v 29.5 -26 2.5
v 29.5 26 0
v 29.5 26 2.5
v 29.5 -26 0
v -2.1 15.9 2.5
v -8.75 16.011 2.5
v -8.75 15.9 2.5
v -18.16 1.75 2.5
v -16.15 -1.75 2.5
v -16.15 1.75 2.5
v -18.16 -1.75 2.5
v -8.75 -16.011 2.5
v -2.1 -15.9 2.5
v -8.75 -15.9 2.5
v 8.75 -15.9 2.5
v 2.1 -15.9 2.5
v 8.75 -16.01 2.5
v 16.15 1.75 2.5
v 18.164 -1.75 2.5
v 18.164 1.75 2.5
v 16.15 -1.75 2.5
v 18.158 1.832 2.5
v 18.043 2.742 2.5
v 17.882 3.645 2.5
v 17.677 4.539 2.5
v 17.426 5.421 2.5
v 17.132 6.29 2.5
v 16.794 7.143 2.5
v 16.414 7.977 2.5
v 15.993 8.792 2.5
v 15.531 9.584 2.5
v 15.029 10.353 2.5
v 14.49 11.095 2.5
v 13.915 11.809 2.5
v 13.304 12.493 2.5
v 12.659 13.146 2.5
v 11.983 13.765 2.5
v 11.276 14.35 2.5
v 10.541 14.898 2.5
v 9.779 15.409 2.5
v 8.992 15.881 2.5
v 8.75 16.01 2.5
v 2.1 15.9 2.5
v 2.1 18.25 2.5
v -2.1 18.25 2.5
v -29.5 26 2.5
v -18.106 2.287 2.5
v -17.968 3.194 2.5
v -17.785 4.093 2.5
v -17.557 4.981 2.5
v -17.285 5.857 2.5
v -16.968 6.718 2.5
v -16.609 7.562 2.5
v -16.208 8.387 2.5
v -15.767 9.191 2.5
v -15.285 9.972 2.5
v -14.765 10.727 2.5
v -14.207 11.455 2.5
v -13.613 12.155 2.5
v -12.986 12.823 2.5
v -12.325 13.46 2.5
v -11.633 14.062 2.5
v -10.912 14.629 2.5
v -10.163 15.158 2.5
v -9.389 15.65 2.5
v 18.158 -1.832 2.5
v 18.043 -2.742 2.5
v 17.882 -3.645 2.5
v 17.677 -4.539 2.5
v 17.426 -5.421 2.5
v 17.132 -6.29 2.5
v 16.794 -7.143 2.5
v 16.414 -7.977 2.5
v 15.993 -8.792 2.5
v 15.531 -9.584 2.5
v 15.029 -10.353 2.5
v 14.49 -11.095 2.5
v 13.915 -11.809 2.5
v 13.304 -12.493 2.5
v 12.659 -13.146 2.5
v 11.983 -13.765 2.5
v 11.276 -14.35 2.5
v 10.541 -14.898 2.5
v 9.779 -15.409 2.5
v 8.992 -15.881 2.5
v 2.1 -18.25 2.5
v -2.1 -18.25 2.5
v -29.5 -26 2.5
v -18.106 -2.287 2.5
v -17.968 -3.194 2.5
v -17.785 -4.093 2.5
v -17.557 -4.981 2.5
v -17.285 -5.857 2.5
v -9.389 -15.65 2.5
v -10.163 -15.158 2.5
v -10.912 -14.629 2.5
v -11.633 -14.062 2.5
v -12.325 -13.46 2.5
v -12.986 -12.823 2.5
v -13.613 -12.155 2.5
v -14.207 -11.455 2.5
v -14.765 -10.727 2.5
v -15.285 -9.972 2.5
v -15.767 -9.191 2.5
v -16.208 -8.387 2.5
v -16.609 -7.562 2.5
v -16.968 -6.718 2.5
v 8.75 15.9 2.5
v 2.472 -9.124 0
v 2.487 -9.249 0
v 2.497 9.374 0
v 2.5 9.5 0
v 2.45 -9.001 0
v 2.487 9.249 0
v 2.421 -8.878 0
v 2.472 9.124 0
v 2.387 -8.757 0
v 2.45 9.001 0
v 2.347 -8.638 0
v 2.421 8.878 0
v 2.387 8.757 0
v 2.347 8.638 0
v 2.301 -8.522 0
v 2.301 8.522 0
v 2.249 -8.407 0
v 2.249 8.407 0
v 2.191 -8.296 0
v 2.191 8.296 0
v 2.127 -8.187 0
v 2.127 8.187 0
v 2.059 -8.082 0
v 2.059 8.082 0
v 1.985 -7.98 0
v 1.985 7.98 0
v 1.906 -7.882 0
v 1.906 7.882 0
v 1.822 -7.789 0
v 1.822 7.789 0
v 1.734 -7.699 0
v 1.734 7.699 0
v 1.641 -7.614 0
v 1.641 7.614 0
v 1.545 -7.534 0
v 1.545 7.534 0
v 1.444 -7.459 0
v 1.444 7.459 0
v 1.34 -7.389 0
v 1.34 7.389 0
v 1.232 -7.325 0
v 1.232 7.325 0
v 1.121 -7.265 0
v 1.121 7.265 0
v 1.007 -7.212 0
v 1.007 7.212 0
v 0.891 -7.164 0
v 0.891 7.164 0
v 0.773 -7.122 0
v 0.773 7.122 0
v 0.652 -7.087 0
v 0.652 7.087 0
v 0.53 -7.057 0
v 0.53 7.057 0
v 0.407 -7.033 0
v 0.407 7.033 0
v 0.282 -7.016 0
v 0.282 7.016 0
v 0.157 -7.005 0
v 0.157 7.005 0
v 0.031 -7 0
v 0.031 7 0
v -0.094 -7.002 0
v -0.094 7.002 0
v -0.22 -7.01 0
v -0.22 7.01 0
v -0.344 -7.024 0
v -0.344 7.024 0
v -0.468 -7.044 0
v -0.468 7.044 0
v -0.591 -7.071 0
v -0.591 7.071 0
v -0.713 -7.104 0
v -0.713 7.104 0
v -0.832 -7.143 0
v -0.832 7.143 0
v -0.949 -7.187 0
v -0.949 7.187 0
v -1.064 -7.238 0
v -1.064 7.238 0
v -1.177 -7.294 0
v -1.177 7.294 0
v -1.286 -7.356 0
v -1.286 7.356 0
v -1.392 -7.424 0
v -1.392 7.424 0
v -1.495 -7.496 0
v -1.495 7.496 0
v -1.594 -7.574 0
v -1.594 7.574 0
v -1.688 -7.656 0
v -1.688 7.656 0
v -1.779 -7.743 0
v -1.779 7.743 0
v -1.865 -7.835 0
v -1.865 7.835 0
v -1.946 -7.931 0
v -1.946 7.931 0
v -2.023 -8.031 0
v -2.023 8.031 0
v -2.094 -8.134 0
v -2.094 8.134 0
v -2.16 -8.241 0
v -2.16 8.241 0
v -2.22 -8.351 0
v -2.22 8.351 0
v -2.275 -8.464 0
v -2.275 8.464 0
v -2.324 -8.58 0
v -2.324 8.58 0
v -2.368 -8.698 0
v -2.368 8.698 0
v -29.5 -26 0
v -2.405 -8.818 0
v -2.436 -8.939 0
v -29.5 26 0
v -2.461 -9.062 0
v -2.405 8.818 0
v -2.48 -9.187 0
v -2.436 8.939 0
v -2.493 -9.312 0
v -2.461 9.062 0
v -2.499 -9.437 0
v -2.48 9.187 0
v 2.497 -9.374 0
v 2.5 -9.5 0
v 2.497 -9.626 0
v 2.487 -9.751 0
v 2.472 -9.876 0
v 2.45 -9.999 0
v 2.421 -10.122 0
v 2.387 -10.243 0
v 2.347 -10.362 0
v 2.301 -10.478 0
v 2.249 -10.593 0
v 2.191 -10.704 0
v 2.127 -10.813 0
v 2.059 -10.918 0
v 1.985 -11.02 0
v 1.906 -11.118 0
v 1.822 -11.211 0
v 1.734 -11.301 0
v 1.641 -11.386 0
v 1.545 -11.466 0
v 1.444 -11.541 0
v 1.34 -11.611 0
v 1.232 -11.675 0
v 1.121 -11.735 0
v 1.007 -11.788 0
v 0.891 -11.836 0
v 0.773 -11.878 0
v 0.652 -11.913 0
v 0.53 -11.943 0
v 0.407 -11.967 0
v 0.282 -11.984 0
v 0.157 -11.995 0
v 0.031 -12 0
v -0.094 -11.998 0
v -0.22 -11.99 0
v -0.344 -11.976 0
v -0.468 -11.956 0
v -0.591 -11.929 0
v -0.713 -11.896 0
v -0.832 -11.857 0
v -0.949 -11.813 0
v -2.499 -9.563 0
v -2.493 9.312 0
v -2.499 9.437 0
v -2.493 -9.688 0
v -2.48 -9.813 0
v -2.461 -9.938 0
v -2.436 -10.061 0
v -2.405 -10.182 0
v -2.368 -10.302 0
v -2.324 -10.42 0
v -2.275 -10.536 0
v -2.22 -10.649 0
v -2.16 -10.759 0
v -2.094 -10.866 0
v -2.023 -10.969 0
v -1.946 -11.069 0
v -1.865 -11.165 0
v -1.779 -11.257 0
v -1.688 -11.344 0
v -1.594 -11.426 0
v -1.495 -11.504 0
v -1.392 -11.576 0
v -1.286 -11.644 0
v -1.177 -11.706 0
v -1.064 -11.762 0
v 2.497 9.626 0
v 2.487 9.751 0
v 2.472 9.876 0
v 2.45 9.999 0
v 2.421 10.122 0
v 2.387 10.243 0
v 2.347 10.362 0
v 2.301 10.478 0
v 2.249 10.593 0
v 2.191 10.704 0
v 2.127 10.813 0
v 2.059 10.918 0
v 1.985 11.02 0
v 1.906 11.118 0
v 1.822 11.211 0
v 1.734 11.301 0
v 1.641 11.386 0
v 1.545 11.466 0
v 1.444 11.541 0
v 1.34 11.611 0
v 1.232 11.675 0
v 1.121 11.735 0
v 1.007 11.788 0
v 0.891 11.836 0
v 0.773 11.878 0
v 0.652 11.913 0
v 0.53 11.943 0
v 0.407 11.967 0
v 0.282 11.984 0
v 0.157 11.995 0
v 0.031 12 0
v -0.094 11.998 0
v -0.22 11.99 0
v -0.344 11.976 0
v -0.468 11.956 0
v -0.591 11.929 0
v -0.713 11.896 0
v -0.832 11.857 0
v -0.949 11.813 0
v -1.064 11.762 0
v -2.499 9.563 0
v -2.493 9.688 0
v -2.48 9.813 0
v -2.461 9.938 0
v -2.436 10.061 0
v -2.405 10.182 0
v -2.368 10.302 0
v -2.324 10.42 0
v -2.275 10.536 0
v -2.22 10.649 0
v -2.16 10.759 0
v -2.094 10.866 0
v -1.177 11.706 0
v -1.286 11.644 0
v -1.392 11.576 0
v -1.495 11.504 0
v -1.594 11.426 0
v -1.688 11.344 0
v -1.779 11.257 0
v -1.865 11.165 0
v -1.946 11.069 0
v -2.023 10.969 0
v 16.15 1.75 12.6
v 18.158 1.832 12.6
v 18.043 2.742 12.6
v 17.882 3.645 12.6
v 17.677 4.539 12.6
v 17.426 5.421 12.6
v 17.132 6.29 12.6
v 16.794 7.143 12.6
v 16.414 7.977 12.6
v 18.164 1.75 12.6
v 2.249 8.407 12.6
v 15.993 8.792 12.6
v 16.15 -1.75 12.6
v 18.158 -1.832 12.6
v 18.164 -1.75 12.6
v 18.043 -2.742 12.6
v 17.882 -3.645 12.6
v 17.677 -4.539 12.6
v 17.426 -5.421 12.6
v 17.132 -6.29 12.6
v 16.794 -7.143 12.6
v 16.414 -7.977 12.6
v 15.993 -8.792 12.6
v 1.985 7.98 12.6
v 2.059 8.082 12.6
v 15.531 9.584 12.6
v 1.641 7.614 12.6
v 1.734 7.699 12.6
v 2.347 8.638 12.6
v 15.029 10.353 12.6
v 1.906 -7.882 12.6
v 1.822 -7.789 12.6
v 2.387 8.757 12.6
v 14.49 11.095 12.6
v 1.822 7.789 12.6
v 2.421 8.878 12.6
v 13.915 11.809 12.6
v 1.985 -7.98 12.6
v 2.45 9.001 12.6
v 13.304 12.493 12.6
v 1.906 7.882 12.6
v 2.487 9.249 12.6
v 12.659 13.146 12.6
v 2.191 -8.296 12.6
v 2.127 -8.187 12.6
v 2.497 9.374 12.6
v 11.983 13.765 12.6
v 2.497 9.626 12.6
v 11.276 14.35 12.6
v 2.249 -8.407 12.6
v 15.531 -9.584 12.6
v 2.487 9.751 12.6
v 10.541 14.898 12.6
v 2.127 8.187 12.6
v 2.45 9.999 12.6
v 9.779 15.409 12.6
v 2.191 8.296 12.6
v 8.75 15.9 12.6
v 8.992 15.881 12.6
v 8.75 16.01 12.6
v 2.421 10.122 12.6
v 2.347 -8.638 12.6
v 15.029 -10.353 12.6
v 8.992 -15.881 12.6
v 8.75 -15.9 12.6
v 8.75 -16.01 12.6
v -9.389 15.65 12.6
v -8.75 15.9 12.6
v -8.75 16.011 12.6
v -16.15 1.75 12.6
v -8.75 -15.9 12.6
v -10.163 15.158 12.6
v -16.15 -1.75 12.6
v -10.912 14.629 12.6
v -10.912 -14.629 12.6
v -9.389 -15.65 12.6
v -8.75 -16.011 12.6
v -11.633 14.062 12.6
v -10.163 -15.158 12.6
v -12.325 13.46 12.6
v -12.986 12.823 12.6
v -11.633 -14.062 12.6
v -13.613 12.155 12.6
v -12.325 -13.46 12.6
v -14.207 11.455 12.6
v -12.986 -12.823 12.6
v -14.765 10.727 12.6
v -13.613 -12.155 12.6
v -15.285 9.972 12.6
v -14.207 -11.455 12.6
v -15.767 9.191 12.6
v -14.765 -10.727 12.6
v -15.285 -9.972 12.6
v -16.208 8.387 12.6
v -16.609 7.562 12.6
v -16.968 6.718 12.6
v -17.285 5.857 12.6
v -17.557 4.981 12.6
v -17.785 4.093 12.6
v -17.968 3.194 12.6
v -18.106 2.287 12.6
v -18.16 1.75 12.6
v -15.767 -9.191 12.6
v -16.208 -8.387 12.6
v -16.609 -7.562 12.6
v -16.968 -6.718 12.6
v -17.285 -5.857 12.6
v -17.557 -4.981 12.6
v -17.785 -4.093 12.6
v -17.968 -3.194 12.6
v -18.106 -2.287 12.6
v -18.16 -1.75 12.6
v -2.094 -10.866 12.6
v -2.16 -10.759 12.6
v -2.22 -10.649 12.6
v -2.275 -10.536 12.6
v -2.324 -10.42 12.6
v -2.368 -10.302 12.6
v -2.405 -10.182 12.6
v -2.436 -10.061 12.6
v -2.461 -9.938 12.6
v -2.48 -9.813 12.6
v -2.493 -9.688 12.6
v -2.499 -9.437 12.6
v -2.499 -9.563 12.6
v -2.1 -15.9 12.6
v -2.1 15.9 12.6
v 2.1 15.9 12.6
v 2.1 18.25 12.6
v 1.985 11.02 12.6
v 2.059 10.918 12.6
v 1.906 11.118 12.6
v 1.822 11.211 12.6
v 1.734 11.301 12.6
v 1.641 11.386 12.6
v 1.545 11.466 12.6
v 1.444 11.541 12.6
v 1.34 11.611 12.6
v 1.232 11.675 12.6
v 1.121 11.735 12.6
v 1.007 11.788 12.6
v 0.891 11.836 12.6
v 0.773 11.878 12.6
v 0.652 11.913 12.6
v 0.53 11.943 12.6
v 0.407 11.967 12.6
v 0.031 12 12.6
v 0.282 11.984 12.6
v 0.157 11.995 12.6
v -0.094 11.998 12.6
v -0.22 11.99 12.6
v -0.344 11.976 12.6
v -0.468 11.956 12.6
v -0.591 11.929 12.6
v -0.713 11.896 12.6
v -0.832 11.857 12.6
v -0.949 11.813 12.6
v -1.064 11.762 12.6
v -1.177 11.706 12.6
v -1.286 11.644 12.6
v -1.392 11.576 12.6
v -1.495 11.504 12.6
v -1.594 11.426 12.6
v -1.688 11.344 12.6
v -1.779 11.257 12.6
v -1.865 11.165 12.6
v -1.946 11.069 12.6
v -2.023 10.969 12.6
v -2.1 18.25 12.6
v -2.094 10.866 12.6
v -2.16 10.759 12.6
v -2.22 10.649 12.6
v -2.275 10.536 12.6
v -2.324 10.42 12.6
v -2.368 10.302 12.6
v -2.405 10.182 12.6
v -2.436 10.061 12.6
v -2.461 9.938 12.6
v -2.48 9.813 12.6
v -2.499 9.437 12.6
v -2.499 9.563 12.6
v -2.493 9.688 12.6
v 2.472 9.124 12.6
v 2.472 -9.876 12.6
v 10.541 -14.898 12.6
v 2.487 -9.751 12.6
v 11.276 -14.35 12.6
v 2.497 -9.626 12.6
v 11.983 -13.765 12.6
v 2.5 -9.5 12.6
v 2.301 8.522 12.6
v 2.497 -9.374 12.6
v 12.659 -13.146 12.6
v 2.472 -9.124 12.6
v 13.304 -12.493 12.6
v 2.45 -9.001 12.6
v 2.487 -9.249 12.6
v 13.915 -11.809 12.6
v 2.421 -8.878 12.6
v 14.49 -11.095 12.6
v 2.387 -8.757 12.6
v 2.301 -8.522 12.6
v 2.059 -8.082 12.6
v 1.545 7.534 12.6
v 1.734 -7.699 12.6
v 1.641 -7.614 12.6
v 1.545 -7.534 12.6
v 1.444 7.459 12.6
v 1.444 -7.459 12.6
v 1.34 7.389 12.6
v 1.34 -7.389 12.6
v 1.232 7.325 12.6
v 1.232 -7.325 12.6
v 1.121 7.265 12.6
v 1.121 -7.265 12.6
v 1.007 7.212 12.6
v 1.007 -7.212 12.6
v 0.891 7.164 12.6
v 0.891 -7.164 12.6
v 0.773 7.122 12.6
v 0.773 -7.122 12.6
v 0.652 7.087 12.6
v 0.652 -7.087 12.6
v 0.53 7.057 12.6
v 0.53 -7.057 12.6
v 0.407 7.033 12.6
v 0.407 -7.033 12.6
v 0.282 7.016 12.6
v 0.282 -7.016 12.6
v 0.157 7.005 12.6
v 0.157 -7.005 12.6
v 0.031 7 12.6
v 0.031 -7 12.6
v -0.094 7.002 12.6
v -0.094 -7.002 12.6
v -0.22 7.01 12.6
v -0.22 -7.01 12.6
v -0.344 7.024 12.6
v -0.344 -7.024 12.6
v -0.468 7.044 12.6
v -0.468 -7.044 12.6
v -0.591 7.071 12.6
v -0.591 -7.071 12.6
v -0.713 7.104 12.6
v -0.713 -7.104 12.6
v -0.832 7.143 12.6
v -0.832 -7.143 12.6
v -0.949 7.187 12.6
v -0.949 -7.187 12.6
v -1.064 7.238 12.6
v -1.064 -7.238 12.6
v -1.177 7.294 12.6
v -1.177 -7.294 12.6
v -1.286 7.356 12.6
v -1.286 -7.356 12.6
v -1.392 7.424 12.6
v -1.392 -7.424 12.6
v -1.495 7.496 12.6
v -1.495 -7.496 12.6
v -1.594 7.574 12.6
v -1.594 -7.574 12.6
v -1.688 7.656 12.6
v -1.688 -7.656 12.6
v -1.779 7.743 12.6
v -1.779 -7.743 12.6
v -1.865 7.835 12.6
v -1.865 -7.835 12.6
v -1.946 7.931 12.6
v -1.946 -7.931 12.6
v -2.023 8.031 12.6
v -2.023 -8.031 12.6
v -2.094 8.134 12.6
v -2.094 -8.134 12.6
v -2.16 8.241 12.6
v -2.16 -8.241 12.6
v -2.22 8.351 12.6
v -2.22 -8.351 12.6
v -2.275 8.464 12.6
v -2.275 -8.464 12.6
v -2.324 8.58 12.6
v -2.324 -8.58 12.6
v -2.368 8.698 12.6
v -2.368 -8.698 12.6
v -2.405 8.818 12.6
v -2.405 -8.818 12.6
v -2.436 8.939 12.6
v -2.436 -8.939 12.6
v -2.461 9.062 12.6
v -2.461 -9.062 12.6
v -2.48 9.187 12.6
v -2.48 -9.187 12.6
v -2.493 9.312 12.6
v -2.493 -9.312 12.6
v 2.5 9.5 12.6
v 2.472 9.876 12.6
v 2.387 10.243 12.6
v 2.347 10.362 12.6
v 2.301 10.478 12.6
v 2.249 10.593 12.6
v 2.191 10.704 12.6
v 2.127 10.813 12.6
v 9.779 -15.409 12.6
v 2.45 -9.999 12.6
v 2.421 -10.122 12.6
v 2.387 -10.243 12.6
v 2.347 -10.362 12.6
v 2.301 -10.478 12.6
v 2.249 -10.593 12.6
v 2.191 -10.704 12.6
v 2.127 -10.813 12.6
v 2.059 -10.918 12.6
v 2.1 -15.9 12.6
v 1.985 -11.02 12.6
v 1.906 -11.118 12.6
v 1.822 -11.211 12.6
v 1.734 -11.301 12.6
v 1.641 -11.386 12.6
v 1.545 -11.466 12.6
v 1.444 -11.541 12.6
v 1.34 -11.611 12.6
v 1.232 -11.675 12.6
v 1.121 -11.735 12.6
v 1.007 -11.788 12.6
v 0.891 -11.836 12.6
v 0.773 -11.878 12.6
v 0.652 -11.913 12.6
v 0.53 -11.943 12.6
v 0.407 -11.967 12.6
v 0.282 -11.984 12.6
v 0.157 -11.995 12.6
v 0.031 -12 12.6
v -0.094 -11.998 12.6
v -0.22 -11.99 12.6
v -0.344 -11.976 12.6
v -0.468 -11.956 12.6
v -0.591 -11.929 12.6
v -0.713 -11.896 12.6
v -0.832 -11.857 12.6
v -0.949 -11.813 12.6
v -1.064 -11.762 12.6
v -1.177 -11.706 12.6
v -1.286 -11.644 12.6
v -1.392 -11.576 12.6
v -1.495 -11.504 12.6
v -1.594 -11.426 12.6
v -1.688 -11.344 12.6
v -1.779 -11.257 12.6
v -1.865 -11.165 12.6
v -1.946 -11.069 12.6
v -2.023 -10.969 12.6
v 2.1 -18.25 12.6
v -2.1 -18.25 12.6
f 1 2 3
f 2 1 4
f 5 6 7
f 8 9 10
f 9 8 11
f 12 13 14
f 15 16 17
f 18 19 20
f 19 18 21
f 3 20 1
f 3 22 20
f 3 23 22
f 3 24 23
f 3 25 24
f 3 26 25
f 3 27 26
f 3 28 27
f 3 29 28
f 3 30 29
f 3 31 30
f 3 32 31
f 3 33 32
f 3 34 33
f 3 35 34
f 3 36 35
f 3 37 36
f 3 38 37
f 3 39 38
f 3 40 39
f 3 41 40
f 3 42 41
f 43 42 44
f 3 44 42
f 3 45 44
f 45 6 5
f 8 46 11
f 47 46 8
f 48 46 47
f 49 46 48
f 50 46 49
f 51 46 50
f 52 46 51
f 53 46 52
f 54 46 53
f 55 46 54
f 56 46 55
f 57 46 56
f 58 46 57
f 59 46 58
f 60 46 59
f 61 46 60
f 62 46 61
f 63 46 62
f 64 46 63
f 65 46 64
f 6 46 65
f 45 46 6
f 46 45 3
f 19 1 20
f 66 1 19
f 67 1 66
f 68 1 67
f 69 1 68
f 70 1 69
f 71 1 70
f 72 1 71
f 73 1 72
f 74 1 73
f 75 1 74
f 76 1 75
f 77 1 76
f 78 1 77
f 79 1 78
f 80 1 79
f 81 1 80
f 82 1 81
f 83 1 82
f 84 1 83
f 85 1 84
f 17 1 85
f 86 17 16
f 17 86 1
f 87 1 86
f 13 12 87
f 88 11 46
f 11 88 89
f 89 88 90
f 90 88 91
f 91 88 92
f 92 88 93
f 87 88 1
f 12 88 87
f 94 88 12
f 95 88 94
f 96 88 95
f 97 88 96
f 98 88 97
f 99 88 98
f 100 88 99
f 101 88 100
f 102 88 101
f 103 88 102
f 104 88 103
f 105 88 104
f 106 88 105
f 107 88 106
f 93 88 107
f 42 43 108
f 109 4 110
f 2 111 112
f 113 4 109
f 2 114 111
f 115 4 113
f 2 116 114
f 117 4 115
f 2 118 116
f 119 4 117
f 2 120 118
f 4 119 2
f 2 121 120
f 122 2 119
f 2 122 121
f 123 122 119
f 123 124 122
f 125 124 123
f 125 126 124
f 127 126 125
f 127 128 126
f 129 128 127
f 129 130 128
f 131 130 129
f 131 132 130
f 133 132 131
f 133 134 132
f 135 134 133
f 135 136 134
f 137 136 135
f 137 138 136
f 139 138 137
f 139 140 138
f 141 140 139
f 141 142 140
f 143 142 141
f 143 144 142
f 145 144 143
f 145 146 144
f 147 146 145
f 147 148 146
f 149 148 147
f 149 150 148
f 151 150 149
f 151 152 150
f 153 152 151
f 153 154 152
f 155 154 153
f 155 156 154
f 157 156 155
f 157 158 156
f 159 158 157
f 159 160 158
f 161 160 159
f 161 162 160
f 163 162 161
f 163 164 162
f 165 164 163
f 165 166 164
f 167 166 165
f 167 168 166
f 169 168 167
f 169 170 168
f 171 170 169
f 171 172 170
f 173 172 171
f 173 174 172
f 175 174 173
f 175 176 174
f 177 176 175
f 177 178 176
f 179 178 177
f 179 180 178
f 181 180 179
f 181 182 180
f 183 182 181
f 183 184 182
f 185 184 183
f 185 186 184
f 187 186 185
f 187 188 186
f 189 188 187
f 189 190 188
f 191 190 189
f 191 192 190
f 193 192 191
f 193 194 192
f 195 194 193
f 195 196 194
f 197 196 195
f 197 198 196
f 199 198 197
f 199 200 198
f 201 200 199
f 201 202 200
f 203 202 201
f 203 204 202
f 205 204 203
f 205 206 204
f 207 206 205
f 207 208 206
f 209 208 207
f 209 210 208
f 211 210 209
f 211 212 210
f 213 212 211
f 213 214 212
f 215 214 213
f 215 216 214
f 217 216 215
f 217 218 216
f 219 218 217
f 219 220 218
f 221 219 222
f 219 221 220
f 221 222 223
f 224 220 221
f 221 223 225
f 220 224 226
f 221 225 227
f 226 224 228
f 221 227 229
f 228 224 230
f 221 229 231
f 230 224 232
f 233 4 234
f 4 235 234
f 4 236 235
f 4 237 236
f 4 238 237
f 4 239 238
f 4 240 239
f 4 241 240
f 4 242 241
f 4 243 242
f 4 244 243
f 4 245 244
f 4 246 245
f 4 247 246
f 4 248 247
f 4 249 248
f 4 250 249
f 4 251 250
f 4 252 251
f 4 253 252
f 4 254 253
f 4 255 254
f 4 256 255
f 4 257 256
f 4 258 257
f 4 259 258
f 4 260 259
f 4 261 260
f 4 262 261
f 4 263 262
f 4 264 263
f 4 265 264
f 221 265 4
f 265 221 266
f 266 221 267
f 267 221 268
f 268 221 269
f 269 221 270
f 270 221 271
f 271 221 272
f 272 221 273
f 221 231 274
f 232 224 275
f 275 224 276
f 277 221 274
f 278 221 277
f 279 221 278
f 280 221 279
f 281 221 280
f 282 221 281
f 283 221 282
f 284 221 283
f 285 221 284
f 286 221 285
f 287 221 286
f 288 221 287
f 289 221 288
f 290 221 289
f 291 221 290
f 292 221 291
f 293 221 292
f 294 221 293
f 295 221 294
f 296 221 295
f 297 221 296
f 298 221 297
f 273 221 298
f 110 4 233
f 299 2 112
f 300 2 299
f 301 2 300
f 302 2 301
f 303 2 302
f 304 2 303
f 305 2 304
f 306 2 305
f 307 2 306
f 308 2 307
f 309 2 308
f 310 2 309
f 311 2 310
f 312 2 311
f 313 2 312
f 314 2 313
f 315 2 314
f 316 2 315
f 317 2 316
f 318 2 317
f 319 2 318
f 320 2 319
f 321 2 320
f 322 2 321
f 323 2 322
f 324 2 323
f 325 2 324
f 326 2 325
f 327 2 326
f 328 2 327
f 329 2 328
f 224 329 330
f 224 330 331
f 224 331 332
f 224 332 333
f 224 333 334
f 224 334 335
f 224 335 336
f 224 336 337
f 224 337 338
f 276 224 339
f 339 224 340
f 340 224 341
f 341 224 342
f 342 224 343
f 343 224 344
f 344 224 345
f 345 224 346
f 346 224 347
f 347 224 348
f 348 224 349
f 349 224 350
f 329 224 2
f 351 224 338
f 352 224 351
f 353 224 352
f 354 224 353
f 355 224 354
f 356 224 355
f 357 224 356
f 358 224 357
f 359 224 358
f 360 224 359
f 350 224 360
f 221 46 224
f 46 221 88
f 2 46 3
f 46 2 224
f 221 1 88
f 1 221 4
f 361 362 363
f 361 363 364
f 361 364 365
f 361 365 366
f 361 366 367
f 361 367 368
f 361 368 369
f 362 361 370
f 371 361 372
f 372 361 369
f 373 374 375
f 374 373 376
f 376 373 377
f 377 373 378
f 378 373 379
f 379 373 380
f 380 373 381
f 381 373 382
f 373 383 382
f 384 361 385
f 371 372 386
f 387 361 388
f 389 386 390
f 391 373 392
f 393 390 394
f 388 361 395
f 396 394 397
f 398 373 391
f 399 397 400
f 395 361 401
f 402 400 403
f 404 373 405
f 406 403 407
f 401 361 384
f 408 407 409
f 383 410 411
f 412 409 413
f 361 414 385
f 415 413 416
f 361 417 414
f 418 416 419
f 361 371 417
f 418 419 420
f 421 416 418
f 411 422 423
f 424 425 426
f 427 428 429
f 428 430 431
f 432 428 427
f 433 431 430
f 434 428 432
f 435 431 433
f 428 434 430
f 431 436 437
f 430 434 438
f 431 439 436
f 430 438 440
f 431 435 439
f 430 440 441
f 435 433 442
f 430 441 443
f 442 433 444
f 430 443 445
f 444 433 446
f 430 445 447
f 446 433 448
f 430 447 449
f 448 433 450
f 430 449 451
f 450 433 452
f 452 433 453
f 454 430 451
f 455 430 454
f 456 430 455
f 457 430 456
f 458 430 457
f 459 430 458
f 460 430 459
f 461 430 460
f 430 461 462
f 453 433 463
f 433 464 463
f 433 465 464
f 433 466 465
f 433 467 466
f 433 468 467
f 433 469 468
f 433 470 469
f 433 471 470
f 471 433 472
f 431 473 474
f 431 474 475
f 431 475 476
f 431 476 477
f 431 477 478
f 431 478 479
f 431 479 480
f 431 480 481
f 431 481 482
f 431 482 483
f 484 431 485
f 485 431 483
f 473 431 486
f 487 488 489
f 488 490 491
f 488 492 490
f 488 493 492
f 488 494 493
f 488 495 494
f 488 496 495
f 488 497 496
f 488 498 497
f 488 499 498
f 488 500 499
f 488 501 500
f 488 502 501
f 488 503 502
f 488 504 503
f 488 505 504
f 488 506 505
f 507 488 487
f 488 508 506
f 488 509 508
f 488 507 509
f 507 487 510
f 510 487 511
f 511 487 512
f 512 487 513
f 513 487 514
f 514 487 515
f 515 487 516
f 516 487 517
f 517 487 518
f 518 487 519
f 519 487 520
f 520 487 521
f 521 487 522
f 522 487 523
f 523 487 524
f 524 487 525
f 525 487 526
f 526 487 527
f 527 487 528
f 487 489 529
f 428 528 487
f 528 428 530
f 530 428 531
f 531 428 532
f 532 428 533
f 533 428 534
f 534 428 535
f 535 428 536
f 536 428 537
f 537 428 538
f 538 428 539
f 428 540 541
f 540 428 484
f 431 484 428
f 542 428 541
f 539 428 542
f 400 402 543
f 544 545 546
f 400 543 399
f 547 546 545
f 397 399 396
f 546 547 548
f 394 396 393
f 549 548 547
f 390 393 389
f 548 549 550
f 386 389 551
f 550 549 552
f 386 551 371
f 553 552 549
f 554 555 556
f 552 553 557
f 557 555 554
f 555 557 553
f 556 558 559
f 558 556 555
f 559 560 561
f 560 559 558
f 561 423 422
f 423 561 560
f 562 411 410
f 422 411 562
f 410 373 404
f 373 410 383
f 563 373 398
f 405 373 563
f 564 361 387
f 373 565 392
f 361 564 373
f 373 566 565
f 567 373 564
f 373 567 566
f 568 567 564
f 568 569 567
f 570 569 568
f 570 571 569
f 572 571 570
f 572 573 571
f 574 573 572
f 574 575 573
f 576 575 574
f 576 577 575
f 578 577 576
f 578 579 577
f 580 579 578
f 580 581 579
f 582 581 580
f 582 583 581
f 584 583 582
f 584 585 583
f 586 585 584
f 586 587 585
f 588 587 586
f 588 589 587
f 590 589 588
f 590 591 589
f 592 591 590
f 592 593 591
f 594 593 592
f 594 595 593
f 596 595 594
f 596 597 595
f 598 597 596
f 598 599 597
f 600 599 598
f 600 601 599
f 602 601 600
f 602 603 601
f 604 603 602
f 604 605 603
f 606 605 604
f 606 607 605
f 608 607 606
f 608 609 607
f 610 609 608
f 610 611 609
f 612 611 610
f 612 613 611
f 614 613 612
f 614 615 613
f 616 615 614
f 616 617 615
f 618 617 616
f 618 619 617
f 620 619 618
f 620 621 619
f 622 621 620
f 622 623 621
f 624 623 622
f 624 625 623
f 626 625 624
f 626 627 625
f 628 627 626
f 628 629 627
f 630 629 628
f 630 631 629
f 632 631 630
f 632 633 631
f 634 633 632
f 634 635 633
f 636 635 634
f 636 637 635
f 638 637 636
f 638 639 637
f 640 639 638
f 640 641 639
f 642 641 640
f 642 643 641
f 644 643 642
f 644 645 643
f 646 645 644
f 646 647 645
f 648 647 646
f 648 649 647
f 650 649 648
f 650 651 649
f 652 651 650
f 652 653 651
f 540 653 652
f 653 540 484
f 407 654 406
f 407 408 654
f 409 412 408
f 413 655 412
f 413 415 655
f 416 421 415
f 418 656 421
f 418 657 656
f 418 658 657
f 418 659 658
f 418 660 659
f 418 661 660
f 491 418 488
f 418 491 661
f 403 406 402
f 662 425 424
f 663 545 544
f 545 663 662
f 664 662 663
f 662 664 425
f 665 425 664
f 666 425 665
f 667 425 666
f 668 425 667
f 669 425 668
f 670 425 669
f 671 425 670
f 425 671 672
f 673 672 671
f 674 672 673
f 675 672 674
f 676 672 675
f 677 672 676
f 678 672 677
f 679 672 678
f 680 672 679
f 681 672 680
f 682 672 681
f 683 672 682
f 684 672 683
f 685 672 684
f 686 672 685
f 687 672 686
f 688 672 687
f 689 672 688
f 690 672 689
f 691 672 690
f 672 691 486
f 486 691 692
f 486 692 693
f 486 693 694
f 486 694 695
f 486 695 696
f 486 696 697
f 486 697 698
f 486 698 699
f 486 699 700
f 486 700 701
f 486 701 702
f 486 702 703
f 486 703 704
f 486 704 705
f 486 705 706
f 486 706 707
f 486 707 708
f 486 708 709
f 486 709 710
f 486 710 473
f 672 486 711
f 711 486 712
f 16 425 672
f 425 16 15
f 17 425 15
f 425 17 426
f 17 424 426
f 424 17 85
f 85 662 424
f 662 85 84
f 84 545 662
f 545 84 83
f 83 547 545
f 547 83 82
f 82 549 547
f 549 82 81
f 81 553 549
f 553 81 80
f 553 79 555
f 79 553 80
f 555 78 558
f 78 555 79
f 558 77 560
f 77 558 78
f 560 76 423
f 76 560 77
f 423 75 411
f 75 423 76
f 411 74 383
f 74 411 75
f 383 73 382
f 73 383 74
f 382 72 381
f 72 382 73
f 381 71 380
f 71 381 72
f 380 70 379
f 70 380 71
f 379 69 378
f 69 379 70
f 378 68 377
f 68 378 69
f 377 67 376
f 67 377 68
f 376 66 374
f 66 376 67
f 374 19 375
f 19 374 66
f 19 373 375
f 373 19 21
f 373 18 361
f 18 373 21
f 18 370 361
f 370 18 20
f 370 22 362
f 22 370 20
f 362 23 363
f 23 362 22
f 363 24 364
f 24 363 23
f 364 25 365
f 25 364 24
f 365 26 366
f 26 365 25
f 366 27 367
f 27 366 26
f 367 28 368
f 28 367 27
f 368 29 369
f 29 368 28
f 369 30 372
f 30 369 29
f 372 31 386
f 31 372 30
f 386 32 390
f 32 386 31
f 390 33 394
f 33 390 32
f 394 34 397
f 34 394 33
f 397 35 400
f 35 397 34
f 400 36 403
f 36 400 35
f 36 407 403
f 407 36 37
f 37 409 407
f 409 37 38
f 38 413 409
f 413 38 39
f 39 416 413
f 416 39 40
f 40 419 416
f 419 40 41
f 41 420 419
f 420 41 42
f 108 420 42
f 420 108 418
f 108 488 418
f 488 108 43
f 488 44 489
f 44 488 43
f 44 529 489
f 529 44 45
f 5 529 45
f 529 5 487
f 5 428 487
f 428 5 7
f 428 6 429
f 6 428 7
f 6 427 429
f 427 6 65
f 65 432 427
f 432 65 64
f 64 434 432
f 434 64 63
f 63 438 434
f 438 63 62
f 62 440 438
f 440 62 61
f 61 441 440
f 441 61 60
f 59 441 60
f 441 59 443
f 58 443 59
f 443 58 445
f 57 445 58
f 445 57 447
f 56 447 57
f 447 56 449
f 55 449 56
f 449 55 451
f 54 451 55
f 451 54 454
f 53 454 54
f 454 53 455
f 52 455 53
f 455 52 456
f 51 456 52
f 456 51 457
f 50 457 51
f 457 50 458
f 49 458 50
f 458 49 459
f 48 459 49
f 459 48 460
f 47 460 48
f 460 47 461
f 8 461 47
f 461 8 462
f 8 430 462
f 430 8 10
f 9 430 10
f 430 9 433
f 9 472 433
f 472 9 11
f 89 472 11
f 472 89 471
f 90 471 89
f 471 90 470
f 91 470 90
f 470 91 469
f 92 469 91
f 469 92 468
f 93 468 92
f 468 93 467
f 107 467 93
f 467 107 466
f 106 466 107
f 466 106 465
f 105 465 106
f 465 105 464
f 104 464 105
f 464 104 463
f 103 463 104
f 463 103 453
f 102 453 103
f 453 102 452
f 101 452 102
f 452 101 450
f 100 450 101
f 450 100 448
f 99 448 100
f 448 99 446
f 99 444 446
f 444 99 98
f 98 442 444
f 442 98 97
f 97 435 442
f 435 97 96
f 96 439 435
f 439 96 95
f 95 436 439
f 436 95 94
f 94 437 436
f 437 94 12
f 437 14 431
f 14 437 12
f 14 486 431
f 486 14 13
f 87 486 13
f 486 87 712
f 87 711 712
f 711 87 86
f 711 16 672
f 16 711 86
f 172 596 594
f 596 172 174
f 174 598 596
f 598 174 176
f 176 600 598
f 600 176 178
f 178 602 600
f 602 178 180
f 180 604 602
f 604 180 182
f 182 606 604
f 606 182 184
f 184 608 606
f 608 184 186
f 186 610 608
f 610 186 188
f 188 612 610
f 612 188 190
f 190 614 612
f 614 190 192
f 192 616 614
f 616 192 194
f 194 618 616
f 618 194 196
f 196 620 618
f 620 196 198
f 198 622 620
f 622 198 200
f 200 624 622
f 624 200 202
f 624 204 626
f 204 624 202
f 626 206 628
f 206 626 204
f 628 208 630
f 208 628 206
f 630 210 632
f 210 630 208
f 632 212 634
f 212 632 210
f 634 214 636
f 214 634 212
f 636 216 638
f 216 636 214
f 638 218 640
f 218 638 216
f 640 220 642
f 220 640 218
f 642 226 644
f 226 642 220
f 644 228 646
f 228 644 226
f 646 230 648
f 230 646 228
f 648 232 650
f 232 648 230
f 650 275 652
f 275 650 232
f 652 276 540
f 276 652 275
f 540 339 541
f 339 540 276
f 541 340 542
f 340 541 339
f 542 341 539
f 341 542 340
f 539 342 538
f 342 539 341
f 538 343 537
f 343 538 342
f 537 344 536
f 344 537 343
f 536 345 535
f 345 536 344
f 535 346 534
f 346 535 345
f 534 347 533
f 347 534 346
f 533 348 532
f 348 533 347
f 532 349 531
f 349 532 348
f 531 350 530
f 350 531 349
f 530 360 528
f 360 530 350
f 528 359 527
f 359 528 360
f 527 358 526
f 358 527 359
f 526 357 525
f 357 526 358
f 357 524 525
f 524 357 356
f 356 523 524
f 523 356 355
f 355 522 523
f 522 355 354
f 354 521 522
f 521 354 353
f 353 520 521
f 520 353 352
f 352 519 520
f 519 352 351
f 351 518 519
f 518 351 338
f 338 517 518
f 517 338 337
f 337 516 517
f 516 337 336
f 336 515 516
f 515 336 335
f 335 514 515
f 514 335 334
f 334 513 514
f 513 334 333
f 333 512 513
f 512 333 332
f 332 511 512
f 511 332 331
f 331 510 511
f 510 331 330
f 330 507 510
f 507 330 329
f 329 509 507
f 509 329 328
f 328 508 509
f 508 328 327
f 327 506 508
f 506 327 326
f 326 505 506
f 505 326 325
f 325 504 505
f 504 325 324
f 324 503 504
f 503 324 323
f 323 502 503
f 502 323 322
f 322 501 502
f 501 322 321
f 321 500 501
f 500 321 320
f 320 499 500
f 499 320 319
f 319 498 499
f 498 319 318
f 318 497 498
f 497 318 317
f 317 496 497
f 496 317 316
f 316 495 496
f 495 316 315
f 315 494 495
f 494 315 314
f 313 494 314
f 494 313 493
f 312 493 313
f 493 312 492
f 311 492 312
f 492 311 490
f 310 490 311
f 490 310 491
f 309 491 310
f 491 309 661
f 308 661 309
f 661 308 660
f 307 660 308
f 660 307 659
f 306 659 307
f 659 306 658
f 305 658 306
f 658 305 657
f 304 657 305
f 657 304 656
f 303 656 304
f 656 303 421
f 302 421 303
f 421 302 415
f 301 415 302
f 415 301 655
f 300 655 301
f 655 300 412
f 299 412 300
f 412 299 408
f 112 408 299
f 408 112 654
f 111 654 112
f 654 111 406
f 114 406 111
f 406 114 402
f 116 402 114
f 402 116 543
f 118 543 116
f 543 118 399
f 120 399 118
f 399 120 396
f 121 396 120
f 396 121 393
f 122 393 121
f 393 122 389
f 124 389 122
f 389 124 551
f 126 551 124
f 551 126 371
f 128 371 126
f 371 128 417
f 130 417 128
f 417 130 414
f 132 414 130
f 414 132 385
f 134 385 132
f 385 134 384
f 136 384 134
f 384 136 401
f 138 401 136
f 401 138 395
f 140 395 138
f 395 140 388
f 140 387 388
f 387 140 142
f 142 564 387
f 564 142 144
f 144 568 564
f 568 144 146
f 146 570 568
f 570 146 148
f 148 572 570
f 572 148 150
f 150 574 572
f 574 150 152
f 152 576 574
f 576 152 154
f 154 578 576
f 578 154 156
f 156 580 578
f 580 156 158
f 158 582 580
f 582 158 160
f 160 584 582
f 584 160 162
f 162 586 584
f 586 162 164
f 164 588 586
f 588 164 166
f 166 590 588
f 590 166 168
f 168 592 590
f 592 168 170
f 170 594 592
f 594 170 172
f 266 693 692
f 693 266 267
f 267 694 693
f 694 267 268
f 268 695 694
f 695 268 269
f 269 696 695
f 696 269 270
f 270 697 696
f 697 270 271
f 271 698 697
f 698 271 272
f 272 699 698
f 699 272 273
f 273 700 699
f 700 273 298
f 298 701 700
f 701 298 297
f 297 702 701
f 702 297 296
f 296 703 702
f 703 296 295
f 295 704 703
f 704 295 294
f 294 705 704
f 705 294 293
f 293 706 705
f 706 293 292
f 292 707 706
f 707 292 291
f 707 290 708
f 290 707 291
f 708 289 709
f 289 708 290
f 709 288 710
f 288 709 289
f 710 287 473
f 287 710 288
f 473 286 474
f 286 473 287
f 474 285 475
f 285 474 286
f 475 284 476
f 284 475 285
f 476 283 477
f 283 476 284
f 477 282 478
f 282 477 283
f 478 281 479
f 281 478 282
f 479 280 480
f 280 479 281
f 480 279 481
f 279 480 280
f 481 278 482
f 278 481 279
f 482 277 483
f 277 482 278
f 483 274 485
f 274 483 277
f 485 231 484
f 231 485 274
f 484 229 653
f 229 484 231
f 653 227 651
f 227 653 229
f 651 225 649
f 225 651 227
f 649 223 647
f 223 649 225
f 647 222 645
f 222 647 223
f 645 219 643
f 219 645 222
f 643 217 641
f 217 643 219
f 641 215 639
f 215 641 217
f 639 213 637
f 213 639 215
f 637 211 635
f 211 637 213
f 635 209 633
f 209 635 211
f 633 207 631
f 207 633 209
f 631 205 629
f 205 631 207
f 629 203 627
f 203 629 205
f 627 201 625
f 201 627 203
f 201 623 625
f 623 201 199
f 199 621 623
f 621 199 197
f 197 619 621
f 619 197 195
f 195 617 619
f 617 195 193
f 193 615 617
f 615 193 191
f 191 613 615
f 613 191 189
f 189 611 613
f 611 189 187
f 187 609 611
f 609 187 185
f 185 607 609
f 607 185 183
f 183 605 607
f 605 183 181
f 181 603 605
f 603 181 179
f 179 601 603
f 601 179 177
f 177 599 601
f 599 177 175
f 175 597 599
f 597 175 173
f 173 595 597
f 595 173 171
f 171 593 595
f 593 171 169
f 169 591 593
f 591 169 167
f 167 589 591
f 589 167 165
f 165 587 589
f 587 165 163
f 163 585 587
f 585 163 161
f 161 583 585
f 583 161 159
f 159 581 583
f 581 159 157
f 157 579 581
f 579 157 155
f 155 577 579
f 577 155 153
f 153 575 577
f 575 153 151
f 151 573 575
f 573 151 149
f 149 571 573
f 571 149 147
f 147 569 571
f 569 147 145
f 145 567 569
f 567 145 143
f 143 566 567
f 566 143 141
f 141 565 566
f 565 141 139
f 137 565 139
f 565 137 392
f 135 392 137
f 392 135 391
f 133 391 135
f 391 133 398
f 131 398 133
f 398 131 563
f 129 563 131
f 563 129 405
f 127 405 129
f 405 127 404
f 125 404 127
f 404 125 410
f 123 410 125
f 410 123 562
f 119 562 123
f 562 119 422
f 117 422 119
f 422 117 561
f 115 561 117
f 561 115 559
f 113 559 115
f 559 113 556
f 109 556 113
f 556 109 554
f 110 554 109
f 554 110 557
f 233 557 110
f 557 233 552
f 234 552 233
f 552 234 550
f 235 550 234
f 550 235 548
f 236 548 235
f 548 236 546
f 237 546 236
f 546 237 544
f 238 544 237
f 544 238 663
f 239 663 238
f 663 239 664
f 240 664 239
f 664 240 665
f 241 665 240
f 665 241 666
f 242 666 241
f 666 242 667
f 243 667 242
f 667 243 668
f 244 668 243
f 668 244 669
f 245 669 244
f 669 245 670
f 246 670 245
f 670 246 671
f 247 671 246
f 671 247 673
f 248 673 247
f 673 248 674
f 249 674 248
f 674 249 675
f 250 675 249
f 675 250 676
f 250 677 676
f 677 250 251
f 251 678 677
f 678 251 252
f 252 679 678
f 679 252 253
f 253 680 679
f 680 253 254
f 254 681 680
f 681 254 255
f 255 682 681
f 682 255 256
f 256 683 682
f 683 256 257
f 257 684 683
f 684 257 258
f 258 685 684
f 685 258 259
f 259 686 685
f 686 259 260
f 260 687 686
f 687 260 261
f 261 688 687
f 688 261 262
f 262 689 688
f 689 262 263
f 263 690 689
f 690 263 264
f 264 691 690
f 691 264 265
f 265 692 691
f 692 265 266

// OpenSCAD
// file: Shapes/Schuko.scad
// added by IndiePandaaaaa|Lukas

module Schuko2D()
{
    difference()
    {
        union()
        {
            difference()
            {
                circle(r = 36.5 / 2);
                square(size = [ 17.5, 50 ], center = true);
                square(size = [ 50, 3.5 ], center = true);
            }
            square(size = [ 32.3, 10 ], center = true);
            square(size = [ 17.6, 31.8 ], center = true);
            square(size = [ 4.2, 36.5 ], center = true);
        }
        for (i = [0:1])
        {
            translate(v = [ 0, -(14.2 + 4.8) / 2 + (14.2 + 4.8) * i ]) circle(r = 5 / 2);
        }
    }
}

module Schuko3D(height, center = true)
{
    linear_extrude(height = height, center = center, convexity = 10, twist = 0, slices = 20, scale = 1.0) Schuko2D();
}
// file: Parts/Screw.scad
// created by IndiePandaaaaa | Lukas

$fn=50;

function cone_diameter(diameter)=diameter * 2;

function cone_diameter_cutout(diameter)=diameter * 2 + 0.5;

function cone_height(diameter)=diameter * 0.75;

module screw(diameter, length=12, cutout_sample=false) {
  module base_model(diameter, length, cone_height, cone_diameter, offset=0) {
    rotate_extrude() {
      polygon([
          [0, 0],
          [(diameter + offset) / 2, 0],
          [(diameter + offset) / 2, (length + offset) - (cone_height + offset)],
          [(cone_diameter + offset) / 2, length + offset],
          [0, length + offset],
        ]);
    }
  }

  if (length < diameter) {
    echo("Screw is too short");
    length=diameter + 5;
    echo("New length is: ", length);
  }

  if (!cutout_sample) {
    translate([0, 0, -length])
      difference() {
        base_model(diameter, length, cone_height(diameter), cone_diameter(diameter));

        // top cross part
        translate([0, 0, length - (cone_height(diameter) - diameter / 2) + .1])
          difference() {
            rotate([0, 0, 45])
              rotate_extrude() {
                polygon([
                    [0, 0],
                    [diameter * 1.4 / 2, 0],
                    [cone_diameter(diameter) / 3, cone_height(diameter) - diameter / 2],
                    [0, cone_height(diameter) - diameter / 2],
                  ]);
              }
            for (i=[0 : 1 : 3]) {
              rotate([0, 0, 90 * i])
                translate([diameter / 3.18 / 2, diameter / 3.18 / 2, 0]) cube(cone_height(diameter));
            }
          }
      }
  } else {
    offset=0;
    diameter=cone_diameter_cutout(diameter) / 2;  // is duplicated by function, used to reduce error
    translate([0, 0, -length - offset / 2]) {
      base_model(diameter, length, cone_height(diameter), cone_diameter(diameter), offset);
      translate([0, 0, length -.005]) cylinder(r=diameter, h=50);
    }
  }
}

module screw_corehole(diameter_screw, diameter_core, unthreaded_length, length=12) {
  union() {
    screw(diameter=diameter_screw, length=unthreaded_length, cutout_sample=true);
    translate([0, 0, -length]) cylinder(d=diameter_core, h=length - unthreaded_length + .1);
  }
}

module screw_with_nut(screw_length, diameter, square_channel=false, tolerance=.1) {
  function od(width) = ((width/2) / cos(30)) * 2; // calculates nut diameter from given width
  nut_thickness=[0.8, 1.6, 2.4, 3.2, 4, 5, 5.5, 6.5];
  nut_width=[2.5, 4, 5.5, 7.1, 8.1, 10.1, 11.1, 13.1];

  if (!(0 < diameter && diameter <= 8 && diameter == round(diameter))) {
    echo("module is only defined for integer values from M1 to M8.");
  } else {
    union() {
      if (!square_channel) {
        screw(diameter=diameter, length=screw_length, cutout_sample=true);

        translate([0, 0, -(screw_length*2 - nut_thickness[diameter - 1])]) 
          cylinder(d=od(nut_width[diameter - 1]) + tolerance, h=screw_length, $fn=6);

      } else {
        screw(diameter=diameter, length=screw_length + diameter, cutout_sample=true);
        translate([-od(nut_width[diameter - 1])/2 - tolerance, -(nut_width[diameter - 1]/2), -(screw_length)]) 
          cube([od(nut_width[diameter - 1]) + screw_length, nut_width[diameter - 1] + tolerance, nut_thickness[diameter - 1] + tolerance]);
      }
    }
  }
}

translate([ 0, 0, 0]) screw(diameter=3.5, length=12, cutout_sample=false);
translate([20, 0, 0]) screw_corehole(diameter_screw=3, diameter_core=2.5, unthreaded_length=15, length=20);
translate([40, 0, 0]) screw_with_nut(screw_length=30, diameter=4, square_channel=false, tolerance=.1);
// main file
// created by IndiePandaaaaa | Lukas

use <Parts/Screw.scad>
use <Shapes/Schuko.scad>

MODEL_TOLERANCE = 0.1;
MODEL_THICKNESS = 3.5;
$fn = $preview ? 25 : 125;

PLATE_DEPTH = 59; // Bremounta

BREMOUNTA_SCREW_DIST = 50;
BREMOUNTA_SCREW_OD = 6;
BREMOUNTA_SCREW_HOLE_ID = 6.5;
BREMOUNTA_SCREW_HOLE_OD = BREMOUNTA_SCREW_HOLE_ID + 1;
BREMOUNTA_SCREW_HOLE_OD_DEPTH = 1;

WOOD_BOARD_THICKNESS = 9;
WOOD_BOARD_WIDTH = 28;
WOOD_BOARD_SCREW_DIST = WOOD_BOARD_WIDTH - 3.5 * 2;
WOOD_SCREWIN_THICKNESS = 18;

module LBracket_short()
{
    SOCKET_WIDTH = 18;
    PLATE_DEPTH_LBRACKET = PLATE_DEPTH + 2;
    PLATE_SCREW_OD = 5;

    difference()
    {
        union()
        {
            cube([ SOCKET_WIDTH, MODEL_THICKNESS, PLATE_DEPTH_LBRACKET + MODEL_TOLERANCE + MODEL_THICKNESS ]);
            cube([ SOCKET_WIDTH, WOOD_SCREWIN_THICKNESS, MODEL_THICKNESS ]);
        }
        translate([ SOCKET_WIDTH / 2, WOOD_SCREWIN_THICKNESS / 2, MODEL_THICKNESS ]) rotate([ 0, 0, 90 ])
            screw(PLATE_SCREW_OD, 12, true);

        for (i = [0:1])
        {
            translate([ SOCKET_WIDTH / 2, 0, BREMOUNTA_SCREW_OD * 1.25 + MODEL_TOLERANCE + BREMOUNTA_SCREW_DIST * i ])
            {
                rotate([ 90, 0, 0 ])
                {
                    screw(BREMOUNTA_SCREW_OD, 12, true);
                    translate([ 0, 0, -MODEL_THICKNESS ])
                        cylinder(d = BREMOUNTA_SCREW_HOLE_OD, h = BREMOUNTA_SCREW_HOLE_OD_DEPTH);
                }
            }
        }
    }
}

module BremountaPlate()
{
    SOCKET_WIDTH = 14;
    PLATE_DEPTH_BPLATE = PLATE_DEPTH + 5;
    PLATE_WIDTH = 21 + SOCKET_WIDTH;
    PLATE_SCREW_OD = 3.5;
    difference()
    {
        union()
        {
            cube([ PLATE_WIDTH, PLATE_DEPTH_BPLATE, MODEL_THICKNESS ]);
            cube([ SOCKET_WIDTH, PLATE_DEPTH_BPLATE, WOOD_BOARD_THICKNESS ]);
            translate([ 0, PLATE_DEPTH_BPLATE / 5, 0 ])
                cube([ SOCKET_WIDTH * 1.75, PLATE_DEPTH_BPLATE / 5 * 3, WOOD_BOARD_THICKNESS ]);
        }
        for (i = [0:1])
        {
            translate(
                [ SOCKET_WIDTH / 2, (PLATE_DEPTH_BPLATE - BREMOUNTA_SCREW_DIST) / 2 + BREMOUNTA_SCREW_DIST * i, 0 ])
            {
                translate([ 0, 0, WOOD_BOARD_THICKNESS - BREMOUNTA_SCREW_HOLE_OD_DEPTH ])
                    cylinder(d = BREMOUNTA_SCREW_HOLE_OD, h = BREMOUNTA_SCREW_HOLE_OD_DEPTH);
                rotate([ 180, 0, 0 ]) screw(BREMOUNTA_SCREW_OD, 30, true);
                translate([ PLATE_WIDTH - SOCKET_WIDTH, 0, PLATE_SCREW_OD ]) screw(PLATE_SCREW_OD, 12, true);
            }
            if (WOOD_BOARD_THICKNESS > PLATE_SCREW_OD * 2)
            {
                translate([
                    SOCKET_WIDTH * 1.75, (PLATE_DEPTH_BPLATE - WOOD_BOARD_SCREW_DIST) / 2 + WOOD_BOARD_SCREW_DIST * i,
                    WOOD_BOARD_THICKNESS / 2
                ]) rotate([ 0, 90, 0 ])
                {
                    screw(PLATE_SCREW_OD, 35, true);
                    cylinder(d = PLATE_SCREW_OD * 2, h = PLATE_WIDTH);
                }
            }
        }
    }
}

module SchukoReferencePlate()
{
    thickness = 2.5;
    union()
    {
        Schuko3D(height = 10.1 + thickness, center = false);
        translate(v = [ -PLATE_DEPTH / 2, -52 / 2, 0 ]) difference()
        {
            cube(size = [ PLATE_DEPTH, 52, thickness ], center = false);
            translate(v = [ (PLATE_DEPTH - 25) / 2, (52 - 25) / 2, -.1 ])
                cube(size = [ 25, 25, thickness + .2 ], center = false);
        }
    }
}
translate(v = [ 0, 0, 0 ]) SchukoReferencePlate();
// translate(v = [ 70, 0, 0 ]) BremountaPlate();
// translate(v = [ 40, 0, 0 ]) LBracket_short();
